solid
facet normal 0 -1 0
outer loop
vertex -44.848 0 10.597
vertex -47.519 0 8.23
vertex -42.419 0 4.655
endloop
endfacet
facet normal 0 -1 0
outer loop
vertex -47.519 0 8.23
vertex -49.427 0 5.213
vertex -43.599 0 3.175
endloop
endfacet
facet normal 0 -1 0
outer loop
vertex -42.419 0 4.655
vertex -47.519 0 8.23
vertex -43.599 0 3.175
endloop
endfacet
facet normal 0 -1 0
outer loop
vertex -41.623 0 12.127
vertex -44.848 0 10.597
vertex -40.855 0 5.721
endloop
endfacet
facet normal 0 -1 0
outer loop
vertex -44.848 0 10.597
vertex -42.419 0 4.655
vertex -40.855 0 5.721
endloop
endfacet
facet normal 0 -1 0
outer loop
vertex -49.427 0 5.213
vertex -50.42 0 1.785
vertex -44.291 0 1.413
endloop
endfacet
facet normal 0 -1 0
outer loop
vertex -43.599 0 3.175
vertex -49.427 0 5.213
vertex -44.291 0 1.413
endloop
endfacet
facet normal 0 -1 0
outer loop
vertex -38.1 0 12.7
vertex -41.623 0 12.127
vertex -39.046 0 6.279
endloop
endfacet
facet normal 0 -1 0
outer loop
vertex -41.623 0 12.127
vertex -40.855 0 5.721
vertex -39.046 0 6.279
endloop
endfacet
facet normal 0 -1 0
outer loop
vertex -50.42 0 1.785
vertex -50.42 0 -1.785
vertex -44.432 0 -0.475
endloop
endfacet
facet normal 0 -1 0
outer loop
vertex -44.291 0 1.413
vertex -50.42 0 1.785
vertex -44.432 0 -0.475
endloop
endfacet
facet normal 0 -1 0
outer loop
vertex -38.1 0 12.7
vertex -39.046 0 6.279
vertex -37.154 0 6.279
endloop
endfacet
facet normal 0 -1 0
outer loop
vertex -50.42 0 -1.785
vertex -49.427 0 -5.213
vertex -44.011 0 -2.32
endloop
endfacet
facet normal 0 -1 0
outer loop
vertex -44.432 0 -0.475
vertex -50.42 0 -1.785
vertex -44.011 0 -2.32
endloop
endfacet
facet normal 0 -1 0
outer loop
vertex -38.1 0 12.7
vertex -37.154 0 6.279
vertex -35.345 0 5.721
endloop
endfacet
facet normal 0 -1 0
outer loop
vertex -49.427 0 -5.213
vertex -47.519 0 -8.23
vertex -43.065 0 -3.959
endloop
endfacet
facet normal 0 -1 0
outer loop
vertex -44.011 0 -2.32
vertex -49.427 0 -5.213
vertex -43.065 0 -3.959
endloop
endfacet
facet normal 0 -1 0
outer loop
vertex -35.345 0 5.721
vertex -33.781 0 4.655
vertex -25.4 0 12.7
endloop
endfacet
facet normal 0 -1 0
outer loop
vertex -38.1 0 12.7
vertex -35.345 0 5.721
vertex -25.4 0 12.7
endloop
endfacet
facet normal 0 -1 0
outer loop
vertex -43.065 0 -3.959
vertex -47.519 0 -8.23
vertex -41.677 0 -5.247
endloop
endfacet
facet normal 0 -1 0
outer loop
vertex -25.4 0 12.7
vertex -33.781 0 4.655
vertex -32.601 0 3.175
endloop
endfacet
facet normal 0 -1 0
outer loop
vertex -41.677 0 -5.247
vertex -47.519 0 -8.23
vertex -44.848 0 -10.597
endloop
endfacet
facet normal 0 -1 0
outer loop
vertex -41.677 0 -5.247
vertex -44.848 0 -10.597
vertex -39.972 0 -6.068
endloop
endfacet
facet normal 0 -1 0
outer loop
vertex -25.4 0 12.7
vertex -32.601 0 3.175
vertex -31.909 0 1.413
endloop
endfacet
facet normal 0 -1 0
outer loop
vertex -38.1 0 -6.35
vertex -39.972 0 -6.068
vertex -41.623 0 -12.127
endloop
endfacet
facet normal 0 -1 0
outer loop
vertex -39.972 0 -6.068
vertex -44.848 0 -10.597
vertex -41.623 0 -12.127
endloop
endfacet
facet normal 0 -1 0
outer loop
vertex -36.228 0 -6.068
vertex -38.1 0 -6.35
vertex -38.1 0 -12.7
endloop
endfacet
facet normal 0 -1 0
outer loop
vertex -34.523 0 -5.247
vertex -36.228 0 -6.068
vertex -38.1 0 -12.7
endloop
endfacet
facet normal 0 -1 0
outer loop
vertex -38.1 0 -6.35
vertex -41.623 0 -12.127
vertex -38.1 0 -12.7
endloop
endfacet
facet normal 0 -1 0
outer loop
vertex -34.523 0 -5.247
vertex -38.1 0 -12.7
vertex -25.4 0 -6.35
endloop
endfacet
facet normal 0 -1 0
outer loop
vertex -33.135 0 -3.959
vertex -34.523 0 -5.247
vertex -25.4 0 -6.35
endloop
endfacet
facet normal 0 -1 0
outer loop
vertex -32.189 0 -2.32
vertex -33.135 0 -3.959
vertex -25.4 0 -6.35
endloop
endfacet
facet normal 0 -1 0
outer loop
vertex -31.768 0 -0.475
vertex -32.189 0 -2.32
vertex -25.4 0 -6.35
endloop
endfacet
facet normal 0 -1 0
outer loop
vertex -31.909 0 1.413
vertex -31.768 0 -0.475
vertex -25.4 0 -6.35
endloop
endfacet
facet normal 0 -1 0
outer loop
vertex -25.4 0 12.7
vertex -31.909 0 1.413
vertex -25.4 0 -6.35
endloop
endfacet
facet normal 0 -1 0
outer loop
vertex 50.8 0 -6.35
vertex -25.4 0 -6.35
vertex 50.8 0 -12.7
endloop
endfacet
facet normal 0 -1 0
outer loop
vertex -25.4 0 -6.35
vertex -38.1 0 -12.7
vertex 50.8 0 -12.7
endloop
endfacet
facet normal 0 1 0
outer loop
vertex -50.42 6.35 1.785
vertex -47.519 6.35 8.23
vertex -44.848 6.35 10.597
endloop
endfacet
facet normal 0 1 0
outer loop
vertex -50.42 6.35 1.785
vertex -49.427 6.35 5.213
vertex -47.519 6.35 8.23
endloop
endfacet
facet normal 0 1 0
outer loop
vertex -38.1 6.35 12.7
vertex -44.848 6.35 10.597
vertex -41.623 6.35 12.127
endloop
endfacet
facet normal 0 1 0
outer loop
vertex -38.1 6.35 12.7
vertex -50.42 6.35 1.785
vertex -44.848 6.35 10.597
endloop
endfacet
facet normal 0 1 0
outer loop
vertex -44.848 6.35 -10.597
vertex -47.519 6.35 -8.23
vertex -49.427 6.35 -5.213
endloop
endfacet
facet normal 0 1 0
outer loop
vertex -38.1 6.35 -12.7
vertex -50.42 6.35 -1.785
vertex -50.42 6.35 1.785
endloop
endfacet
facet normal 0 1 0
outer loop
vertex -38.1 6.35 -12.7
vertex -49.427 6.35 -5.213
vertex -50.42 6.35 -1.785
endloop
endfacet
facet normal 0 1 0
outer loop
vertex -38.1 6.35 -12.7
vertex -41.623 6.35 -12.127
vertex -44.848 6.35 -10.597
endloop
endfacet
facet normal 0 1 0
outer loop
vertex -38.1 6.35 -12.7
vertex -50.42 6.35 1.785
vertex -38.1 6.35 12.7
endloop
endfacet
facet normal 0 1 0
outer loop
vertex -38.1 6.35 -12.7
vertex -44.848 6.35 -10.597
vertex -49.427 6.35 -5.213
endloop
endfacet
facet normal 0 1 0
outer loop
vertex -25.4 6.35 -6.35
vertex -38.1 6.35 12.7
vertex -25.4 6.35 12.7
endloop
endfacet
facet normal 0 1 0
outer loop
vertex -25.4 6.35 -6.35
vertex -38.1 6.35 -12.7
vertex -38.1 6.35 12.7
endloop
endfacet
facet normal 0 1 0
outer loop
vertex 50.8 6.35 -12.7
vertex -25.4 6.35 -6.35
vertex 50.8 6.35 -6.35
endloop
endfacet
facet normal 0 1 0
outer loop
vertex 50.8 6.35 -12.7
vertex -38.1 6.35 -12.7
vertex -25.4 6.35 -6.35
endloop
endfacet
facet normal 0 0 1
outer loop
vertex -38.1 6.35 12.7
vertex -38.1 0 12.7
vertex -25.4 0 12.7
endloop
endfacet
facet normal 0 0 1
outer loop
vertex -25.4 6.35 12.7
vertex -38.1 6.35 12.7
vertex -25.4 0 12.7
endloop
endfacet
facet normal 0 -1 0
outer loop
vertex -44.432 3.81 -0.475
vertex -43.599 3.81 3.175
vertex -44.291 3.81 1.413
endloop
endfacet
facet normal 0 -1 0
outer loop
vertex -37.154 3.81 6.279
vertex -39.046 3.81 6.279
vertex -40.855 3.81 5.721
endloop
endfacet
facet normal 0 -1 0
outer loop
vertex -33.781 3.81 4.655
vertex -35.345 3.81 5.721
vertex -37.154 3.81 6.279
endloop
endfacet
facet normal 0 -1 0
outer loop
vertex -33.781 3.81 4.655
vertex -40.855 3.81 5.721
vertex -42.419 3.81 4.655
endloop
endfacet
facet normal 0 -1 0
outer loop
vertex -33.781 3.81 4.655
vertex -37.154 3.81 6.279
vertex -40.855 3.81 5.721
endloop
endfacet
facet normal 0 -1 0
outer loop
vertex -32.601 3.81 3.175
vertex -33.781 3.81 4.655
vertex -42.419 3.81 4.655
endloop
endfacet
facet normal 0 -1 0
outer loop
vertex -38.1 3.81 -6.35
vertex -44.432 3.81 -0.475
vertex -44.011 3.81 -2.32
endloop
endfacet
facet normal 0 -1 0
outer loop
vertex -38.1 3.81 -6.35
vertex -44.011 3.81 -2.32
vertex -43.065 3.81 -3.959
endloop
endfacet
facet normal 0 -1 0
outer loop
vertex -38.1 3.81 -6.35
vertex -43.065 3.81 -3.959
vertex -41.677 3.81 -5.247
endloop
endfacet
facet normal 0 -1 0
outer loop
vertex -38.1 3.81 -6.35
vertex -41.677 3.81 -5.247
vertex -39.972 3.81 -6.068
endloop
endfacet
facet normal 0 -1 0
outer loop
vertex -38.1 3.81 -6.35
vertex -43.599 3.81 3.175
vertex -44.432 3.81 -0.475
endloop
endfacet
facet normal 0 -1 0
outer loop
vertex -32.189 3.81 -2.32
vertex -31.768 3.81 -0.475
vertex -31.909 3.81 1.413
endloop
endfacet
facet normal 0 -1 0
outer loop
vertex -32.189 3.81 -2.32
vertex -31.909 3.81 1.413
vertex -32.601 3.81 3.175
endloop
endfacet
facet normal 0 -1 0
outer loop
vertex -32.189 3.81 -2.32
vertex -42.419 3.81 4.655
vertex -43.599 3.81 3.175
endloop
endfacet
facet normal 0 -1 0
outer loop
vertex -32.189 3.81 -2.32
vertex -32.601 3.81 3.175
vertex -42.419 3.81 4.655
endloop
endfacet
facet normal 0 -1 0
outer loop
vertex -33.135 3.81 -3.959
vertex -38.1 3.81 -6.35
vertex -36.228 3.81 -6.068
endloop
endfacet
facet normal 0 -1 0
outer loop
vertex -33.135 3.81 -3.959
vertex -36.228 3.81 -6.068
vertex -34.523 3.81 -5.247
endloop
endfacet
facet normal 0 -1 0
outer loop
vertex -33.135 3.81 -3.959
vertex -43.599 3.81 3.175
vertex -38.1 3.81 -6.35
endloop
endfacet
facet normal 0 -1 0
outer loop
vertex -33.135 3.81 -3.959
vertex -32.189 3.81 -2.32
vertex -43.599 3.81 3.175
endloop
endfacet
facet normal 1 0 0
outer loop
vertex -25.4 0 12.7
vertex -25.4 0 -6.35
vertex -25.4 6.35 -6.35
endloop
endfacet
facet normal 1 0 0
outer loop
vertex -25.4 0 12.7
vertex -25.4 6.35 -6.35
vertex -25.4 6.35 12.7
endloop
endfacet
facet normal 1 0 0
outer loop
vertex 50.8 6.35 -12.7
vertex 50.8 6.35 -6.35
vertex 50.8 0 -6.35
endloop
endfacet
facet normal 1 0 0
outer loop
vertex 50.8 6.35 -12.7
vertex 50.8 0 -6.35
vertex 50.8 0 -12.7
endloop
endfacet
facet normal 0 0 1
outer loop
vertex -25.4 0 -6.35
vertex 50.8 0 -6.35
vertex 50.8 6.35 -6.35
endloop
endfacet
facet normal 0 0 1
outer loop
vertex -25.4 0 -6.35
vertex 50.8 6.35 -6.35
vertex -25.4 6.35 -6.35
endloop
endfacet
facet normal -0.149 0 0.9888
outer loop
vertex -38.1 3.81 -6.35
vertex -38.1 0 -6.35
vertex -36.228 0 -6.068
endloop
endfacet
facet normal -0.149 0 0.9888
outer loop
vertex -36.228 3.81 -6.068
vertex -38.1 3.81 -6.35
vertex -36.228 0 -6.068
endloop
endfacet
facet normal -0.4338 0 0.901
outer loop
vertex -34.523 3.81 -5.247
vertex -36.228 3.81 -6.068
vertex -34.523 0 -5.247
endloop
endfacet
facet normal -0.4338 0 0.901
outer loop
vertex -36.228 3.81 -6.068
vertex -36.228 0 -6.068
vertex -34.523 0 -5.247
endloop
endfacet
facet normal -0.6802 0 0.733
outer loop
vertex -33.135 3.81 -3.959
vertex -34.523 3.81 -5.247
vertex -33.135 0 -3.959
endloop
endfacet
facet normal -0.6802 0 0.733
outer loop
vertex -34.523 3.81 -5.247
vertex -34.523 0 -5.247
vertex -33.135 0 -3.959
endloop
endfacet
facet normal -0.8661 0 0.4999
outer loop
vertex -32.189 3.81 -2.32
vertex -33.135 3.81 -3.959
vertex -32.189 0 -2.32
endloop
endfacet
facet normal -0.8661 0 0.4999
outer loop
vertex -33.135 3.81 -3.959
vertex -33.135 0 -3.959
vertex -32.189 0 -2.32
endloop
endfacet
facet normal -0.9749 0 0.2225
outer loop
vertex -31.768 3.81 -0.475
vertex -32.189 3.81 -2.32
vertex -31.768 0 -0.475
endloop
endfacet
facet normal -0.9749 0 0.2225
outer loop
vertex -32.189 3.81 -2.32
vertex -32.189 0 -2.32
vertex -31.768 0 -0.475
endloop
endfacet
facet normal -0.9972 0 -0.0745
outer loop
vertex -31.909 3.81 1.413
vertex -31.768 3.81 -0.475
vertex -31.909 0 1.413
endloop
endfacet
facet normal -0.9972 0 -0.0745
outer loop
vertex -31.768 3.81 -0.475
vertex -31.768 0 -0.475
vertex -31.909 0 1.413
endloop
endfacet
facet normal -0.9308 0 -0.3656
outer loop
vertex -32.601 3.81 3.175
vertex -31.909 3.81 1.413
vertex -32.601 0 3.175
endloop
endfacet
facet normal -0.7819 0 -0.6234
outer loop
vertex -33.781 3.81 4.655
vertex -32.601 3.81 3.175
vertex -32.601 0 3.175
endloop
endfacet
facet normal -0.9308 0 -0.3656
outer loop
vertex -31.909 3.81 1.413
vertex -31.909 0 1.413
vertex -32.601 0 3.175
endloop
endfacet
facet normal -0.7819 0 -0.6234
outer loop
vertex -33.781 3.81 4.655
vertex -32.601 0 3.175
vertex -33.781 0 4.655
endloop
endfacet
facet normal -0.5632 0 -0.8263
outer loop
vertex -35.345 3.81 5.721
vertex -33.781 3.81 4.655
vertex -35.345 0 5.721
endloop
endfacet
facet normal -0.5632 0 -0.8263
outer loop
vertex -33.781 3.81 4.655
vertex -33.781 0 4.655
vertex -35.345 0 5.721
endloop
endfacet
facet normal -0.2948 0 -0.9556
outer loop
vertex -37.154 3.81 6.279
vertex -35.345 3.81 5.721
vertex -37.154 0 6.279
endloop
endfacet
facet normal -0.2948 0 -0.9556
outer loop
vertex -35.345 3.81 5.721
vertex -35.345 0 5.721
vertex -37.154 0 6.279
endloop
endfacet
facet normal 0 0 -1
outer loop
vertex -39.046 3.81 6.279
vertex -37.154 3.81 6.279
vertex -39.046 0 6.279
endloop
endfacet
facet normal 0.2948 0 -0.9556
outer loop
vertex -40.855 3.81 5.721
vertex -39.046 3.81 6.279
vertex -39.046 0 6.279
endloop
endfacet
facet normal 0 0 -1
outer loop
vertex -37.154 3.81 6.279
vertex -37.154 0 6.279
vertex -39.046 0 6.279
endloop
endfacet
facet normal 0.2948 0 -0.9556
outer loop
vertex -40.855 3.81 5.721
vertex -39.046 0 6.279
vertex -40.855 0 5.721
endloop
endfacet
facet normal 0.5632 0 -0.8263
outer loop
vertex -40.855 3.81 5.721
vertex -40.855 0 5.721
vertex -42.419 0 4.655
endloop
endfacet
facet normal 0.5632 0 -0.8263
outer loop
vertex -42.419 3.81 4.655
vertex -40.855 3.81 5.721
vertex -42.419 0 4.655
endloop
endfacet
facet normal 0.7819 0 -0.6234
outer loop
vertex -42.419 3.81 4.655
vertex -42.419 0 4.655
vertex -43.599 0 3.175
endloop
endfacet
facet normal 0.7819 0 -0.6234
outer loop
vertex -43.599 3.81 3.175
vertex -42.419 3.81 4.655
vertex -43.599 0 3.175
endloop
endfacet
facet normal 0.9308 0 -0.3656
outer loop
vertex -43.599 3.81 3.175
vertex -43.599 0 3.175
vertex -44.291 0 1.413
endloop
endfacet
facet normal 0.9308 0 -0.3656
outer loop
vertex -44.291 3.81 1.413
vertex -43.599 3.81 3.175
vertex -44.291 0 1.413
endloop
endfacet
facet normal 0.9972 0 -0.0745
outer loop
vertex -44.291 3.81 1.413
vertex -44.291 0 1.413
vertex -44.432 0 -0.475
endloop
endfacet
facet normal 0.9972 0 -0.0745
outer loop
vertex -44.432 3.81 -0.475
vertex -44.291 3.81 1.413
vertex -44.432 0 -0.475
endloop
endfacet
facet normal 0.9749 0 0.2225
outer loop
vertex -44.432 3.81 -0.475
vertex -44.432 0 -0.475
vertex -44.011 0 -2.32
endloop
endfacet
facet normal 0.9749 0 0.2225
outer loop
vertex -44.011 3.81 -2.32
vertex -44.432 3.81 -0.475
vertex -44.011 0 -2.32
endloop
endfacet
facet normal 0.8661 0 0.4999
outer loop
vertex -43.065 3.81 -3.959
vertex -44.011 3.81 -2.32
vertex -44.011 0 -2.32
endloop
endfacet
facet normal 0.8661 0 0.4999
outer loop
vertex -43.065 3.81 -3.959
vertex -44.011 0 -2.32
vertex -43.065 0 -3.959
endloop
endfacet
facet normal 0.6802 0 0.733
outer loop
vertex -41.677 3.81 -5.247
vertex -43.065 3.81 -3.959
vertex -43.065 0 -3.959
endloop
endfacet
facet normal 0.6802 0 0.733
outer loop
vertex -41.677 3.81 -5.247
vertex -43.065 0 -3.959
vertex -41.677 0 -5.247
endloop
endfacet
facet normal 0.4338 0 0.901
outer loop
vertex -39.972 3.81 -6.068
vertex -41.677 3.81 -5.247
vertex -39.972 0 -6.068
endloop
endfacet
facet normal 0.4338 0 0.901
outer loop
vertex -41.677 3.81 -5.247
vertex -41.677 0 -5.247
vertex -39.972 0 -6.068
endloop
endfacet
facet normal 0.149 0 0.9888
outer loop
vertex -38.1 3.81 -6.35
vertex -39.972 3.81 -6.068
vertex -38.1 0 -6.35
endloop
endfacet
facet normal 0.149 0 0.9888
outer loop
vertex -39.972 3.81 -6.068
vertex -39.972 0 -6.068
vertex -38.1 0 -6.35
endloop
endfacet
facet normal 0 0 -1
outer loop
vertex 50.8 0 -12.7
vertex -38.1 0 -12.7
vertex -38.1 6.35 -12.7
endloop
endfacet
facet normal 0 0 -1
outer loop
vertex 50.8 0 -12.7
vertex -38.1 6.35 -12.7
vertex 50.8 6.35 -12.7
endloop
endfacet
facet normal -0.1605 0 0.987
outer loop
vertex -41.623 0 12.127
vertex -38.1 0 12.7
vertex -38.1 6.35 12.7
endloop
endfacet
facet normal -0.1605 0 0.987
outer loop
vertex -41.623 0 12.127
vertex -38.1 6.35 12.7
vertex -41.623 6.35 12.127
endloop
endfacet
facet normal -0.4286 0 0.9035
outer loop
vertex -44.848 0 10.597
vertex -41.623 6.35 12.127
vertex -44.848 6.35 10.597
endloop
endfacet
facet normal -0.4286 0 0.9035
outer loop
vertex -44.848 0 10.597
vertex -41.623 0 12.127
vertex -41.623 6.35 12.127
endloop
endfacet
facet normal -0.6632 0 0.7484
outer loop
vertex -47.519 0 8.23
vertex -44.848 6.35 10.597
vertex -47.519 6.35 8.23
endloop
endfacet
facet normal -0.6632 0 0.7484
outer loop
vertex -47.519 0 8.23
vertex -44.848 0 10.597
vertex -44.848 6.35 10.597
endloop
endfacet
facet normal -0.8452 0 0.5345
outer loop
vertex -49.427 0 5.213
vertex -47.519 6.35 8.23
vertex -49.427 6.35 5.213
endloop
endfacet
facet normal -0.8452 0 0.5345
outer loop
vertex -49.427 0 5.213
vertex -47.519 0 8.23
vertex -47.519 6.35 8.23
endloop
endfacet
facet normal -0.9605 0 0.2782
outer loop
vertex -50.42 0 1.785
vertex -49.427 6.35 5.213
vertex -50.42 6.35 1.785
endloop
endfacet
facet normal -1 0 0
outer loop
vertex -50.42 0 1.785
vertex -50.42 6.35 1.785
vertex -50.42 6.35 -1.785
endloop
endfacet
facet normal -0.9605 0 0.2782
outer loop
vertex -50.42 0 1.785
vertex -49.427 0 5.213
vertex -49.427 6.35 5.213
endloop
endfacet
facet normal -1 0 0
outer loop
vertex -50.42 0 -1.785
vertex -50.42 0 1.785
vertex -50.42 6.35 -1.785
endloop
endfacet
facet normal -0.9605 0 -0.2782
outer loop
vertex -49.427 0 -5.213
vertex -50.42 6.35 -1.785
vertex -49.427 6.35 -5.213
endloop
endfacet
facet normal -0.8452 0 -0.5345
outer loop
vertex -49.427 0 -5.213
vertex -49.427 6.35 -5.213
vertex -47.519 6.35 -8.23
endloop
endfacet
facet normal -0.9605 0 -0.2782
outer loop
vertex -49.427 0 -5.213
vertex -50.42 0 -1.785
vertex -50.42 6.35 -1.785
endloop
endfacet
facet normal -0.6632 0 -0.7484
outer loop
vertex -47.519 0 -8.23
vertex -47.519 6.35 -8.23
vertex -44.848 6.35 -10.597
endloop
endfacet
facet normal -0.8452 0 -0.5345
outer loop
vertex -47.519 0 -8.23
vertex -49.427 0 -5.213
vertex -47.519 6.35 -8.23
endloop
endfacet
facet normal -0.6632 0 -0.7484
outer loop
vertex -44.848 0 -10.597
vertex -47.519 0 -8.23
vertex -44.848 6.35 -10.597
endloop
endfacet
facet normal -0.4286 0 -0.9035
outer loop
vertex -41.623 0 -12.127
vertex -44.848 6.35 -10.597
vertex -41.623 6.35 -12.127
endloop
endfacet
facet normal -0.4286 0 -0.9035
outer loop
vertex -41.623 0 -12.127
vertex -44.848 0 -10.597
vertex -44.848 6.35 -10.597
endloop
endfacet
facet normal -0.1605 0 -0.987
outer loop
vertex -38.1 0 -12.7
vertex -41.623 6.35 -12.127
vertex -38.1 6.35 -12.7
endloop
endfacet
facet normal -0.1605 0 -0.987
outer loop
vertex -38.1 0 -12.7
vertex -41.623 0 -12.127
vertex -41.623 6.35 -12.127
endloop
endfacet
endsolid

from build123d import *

# Parameters (mm, degrees)
SKETCH2_W               = 101.6
SKETCH2_H               = 25.4
BOSS_EXTRUDE1_DEPTH     = 6.35
SKETCH3_R               = 6.35
CUT_EXTRUDE1_DEPTH      = 3.81
CUT_EXTRUDE2_DEPTH      = 53.74706153
CUT_EXTRUDE2_DEPTH_BACK = 6.35
CUT_EXTRUDE3_DEPTH      = 53.74706153
CUT_EXTRUDE3_DEPTH_BACK = 6.35


with BuildPart() as part:
    # Sketch2 → Boss-Extrude1 (new body)
    with BuildSketch(Plane(origin=(0, 0, 0), x_dir=(1, 0, 0), z_dir=(0, 1, 0))):
        Rectangle(SKETCH2_W, SKETCH2_H)
    extrude(amount=BOSS_EXTRUDE1_DEPTH)

    # Sketch3 → Cut-Extrude1 (cut)
    with BuildSketch(Plane.XZ):
        with Locations(Location((-38.1, 0, 0), (0, 0, 270))):
            Circle(SKETCH3_R)
    extrude(amount=-CUT_EXTRUDE1_DEPTH, mode=Mode.SUBTRACT)

    # Sketch4 → Cut-Extrude2 (cut, two sides: drawn at the far end of the back side and taken through both)
    with BuildSketch(Plane(origin=(0, 6.35, 0), x_dir=(1, 0, 0), z_dir=(0, 1, 0)).offset(-CUT_EXTRUDE2_DEPTH_BACK)):
        Polygon((267.54102157, 6.35), (50.8, 6.35), (-25.4, 6.35), (-25.4, 0), (-25.4, -12.7), (-25.4, -229.44102157), (246.403770405, -567.12340506), (539.344791976, -331.332383489), align=None)
    extrude(amount=CUT_EXTRUDE2_DEPTH + CUT_EXTRUDE2_DEPTH_BACK, mode=Mode.SUBTRACT)

    # Sketch5 → Cut-Extrude3 (cut, two sides: drawn at the far end of the back side and taken through both)
    with BuildSketch(Plane(origin=(0, 6.35, 0), x_dir=(1, 0, 0), z_dir=(0, 1, 0)).offset(-CUT_EXTRUDE3_DEPTH_BACK)):
        with BuildLine():
            Line((156.775019491, -16.637334418), (-38.1, -12.7))
            ThreePointArc((-38.1, -12.7), (-50.545995938, 0), (-38.1, 12.7))
            Line((-38.1, 12.7), (156.775019491, 16.637334418))
            Line((156.775019491, 16.637334418), (-233.054562885, 16.637334418))
            Line((-233.054562885, 16.637334418), (-233.054562885, -16.637334418))
            Line((-233.054562885, -16.637334418), (156.775019491, -16.637334418))
        make_face()
    extrude(amount=CUT_EXTRUDE3_DEPTH + CUT_EXTRUDE3_DEPTH_BACK, mode=Mode.SUBTRACT)


solid = part.part
